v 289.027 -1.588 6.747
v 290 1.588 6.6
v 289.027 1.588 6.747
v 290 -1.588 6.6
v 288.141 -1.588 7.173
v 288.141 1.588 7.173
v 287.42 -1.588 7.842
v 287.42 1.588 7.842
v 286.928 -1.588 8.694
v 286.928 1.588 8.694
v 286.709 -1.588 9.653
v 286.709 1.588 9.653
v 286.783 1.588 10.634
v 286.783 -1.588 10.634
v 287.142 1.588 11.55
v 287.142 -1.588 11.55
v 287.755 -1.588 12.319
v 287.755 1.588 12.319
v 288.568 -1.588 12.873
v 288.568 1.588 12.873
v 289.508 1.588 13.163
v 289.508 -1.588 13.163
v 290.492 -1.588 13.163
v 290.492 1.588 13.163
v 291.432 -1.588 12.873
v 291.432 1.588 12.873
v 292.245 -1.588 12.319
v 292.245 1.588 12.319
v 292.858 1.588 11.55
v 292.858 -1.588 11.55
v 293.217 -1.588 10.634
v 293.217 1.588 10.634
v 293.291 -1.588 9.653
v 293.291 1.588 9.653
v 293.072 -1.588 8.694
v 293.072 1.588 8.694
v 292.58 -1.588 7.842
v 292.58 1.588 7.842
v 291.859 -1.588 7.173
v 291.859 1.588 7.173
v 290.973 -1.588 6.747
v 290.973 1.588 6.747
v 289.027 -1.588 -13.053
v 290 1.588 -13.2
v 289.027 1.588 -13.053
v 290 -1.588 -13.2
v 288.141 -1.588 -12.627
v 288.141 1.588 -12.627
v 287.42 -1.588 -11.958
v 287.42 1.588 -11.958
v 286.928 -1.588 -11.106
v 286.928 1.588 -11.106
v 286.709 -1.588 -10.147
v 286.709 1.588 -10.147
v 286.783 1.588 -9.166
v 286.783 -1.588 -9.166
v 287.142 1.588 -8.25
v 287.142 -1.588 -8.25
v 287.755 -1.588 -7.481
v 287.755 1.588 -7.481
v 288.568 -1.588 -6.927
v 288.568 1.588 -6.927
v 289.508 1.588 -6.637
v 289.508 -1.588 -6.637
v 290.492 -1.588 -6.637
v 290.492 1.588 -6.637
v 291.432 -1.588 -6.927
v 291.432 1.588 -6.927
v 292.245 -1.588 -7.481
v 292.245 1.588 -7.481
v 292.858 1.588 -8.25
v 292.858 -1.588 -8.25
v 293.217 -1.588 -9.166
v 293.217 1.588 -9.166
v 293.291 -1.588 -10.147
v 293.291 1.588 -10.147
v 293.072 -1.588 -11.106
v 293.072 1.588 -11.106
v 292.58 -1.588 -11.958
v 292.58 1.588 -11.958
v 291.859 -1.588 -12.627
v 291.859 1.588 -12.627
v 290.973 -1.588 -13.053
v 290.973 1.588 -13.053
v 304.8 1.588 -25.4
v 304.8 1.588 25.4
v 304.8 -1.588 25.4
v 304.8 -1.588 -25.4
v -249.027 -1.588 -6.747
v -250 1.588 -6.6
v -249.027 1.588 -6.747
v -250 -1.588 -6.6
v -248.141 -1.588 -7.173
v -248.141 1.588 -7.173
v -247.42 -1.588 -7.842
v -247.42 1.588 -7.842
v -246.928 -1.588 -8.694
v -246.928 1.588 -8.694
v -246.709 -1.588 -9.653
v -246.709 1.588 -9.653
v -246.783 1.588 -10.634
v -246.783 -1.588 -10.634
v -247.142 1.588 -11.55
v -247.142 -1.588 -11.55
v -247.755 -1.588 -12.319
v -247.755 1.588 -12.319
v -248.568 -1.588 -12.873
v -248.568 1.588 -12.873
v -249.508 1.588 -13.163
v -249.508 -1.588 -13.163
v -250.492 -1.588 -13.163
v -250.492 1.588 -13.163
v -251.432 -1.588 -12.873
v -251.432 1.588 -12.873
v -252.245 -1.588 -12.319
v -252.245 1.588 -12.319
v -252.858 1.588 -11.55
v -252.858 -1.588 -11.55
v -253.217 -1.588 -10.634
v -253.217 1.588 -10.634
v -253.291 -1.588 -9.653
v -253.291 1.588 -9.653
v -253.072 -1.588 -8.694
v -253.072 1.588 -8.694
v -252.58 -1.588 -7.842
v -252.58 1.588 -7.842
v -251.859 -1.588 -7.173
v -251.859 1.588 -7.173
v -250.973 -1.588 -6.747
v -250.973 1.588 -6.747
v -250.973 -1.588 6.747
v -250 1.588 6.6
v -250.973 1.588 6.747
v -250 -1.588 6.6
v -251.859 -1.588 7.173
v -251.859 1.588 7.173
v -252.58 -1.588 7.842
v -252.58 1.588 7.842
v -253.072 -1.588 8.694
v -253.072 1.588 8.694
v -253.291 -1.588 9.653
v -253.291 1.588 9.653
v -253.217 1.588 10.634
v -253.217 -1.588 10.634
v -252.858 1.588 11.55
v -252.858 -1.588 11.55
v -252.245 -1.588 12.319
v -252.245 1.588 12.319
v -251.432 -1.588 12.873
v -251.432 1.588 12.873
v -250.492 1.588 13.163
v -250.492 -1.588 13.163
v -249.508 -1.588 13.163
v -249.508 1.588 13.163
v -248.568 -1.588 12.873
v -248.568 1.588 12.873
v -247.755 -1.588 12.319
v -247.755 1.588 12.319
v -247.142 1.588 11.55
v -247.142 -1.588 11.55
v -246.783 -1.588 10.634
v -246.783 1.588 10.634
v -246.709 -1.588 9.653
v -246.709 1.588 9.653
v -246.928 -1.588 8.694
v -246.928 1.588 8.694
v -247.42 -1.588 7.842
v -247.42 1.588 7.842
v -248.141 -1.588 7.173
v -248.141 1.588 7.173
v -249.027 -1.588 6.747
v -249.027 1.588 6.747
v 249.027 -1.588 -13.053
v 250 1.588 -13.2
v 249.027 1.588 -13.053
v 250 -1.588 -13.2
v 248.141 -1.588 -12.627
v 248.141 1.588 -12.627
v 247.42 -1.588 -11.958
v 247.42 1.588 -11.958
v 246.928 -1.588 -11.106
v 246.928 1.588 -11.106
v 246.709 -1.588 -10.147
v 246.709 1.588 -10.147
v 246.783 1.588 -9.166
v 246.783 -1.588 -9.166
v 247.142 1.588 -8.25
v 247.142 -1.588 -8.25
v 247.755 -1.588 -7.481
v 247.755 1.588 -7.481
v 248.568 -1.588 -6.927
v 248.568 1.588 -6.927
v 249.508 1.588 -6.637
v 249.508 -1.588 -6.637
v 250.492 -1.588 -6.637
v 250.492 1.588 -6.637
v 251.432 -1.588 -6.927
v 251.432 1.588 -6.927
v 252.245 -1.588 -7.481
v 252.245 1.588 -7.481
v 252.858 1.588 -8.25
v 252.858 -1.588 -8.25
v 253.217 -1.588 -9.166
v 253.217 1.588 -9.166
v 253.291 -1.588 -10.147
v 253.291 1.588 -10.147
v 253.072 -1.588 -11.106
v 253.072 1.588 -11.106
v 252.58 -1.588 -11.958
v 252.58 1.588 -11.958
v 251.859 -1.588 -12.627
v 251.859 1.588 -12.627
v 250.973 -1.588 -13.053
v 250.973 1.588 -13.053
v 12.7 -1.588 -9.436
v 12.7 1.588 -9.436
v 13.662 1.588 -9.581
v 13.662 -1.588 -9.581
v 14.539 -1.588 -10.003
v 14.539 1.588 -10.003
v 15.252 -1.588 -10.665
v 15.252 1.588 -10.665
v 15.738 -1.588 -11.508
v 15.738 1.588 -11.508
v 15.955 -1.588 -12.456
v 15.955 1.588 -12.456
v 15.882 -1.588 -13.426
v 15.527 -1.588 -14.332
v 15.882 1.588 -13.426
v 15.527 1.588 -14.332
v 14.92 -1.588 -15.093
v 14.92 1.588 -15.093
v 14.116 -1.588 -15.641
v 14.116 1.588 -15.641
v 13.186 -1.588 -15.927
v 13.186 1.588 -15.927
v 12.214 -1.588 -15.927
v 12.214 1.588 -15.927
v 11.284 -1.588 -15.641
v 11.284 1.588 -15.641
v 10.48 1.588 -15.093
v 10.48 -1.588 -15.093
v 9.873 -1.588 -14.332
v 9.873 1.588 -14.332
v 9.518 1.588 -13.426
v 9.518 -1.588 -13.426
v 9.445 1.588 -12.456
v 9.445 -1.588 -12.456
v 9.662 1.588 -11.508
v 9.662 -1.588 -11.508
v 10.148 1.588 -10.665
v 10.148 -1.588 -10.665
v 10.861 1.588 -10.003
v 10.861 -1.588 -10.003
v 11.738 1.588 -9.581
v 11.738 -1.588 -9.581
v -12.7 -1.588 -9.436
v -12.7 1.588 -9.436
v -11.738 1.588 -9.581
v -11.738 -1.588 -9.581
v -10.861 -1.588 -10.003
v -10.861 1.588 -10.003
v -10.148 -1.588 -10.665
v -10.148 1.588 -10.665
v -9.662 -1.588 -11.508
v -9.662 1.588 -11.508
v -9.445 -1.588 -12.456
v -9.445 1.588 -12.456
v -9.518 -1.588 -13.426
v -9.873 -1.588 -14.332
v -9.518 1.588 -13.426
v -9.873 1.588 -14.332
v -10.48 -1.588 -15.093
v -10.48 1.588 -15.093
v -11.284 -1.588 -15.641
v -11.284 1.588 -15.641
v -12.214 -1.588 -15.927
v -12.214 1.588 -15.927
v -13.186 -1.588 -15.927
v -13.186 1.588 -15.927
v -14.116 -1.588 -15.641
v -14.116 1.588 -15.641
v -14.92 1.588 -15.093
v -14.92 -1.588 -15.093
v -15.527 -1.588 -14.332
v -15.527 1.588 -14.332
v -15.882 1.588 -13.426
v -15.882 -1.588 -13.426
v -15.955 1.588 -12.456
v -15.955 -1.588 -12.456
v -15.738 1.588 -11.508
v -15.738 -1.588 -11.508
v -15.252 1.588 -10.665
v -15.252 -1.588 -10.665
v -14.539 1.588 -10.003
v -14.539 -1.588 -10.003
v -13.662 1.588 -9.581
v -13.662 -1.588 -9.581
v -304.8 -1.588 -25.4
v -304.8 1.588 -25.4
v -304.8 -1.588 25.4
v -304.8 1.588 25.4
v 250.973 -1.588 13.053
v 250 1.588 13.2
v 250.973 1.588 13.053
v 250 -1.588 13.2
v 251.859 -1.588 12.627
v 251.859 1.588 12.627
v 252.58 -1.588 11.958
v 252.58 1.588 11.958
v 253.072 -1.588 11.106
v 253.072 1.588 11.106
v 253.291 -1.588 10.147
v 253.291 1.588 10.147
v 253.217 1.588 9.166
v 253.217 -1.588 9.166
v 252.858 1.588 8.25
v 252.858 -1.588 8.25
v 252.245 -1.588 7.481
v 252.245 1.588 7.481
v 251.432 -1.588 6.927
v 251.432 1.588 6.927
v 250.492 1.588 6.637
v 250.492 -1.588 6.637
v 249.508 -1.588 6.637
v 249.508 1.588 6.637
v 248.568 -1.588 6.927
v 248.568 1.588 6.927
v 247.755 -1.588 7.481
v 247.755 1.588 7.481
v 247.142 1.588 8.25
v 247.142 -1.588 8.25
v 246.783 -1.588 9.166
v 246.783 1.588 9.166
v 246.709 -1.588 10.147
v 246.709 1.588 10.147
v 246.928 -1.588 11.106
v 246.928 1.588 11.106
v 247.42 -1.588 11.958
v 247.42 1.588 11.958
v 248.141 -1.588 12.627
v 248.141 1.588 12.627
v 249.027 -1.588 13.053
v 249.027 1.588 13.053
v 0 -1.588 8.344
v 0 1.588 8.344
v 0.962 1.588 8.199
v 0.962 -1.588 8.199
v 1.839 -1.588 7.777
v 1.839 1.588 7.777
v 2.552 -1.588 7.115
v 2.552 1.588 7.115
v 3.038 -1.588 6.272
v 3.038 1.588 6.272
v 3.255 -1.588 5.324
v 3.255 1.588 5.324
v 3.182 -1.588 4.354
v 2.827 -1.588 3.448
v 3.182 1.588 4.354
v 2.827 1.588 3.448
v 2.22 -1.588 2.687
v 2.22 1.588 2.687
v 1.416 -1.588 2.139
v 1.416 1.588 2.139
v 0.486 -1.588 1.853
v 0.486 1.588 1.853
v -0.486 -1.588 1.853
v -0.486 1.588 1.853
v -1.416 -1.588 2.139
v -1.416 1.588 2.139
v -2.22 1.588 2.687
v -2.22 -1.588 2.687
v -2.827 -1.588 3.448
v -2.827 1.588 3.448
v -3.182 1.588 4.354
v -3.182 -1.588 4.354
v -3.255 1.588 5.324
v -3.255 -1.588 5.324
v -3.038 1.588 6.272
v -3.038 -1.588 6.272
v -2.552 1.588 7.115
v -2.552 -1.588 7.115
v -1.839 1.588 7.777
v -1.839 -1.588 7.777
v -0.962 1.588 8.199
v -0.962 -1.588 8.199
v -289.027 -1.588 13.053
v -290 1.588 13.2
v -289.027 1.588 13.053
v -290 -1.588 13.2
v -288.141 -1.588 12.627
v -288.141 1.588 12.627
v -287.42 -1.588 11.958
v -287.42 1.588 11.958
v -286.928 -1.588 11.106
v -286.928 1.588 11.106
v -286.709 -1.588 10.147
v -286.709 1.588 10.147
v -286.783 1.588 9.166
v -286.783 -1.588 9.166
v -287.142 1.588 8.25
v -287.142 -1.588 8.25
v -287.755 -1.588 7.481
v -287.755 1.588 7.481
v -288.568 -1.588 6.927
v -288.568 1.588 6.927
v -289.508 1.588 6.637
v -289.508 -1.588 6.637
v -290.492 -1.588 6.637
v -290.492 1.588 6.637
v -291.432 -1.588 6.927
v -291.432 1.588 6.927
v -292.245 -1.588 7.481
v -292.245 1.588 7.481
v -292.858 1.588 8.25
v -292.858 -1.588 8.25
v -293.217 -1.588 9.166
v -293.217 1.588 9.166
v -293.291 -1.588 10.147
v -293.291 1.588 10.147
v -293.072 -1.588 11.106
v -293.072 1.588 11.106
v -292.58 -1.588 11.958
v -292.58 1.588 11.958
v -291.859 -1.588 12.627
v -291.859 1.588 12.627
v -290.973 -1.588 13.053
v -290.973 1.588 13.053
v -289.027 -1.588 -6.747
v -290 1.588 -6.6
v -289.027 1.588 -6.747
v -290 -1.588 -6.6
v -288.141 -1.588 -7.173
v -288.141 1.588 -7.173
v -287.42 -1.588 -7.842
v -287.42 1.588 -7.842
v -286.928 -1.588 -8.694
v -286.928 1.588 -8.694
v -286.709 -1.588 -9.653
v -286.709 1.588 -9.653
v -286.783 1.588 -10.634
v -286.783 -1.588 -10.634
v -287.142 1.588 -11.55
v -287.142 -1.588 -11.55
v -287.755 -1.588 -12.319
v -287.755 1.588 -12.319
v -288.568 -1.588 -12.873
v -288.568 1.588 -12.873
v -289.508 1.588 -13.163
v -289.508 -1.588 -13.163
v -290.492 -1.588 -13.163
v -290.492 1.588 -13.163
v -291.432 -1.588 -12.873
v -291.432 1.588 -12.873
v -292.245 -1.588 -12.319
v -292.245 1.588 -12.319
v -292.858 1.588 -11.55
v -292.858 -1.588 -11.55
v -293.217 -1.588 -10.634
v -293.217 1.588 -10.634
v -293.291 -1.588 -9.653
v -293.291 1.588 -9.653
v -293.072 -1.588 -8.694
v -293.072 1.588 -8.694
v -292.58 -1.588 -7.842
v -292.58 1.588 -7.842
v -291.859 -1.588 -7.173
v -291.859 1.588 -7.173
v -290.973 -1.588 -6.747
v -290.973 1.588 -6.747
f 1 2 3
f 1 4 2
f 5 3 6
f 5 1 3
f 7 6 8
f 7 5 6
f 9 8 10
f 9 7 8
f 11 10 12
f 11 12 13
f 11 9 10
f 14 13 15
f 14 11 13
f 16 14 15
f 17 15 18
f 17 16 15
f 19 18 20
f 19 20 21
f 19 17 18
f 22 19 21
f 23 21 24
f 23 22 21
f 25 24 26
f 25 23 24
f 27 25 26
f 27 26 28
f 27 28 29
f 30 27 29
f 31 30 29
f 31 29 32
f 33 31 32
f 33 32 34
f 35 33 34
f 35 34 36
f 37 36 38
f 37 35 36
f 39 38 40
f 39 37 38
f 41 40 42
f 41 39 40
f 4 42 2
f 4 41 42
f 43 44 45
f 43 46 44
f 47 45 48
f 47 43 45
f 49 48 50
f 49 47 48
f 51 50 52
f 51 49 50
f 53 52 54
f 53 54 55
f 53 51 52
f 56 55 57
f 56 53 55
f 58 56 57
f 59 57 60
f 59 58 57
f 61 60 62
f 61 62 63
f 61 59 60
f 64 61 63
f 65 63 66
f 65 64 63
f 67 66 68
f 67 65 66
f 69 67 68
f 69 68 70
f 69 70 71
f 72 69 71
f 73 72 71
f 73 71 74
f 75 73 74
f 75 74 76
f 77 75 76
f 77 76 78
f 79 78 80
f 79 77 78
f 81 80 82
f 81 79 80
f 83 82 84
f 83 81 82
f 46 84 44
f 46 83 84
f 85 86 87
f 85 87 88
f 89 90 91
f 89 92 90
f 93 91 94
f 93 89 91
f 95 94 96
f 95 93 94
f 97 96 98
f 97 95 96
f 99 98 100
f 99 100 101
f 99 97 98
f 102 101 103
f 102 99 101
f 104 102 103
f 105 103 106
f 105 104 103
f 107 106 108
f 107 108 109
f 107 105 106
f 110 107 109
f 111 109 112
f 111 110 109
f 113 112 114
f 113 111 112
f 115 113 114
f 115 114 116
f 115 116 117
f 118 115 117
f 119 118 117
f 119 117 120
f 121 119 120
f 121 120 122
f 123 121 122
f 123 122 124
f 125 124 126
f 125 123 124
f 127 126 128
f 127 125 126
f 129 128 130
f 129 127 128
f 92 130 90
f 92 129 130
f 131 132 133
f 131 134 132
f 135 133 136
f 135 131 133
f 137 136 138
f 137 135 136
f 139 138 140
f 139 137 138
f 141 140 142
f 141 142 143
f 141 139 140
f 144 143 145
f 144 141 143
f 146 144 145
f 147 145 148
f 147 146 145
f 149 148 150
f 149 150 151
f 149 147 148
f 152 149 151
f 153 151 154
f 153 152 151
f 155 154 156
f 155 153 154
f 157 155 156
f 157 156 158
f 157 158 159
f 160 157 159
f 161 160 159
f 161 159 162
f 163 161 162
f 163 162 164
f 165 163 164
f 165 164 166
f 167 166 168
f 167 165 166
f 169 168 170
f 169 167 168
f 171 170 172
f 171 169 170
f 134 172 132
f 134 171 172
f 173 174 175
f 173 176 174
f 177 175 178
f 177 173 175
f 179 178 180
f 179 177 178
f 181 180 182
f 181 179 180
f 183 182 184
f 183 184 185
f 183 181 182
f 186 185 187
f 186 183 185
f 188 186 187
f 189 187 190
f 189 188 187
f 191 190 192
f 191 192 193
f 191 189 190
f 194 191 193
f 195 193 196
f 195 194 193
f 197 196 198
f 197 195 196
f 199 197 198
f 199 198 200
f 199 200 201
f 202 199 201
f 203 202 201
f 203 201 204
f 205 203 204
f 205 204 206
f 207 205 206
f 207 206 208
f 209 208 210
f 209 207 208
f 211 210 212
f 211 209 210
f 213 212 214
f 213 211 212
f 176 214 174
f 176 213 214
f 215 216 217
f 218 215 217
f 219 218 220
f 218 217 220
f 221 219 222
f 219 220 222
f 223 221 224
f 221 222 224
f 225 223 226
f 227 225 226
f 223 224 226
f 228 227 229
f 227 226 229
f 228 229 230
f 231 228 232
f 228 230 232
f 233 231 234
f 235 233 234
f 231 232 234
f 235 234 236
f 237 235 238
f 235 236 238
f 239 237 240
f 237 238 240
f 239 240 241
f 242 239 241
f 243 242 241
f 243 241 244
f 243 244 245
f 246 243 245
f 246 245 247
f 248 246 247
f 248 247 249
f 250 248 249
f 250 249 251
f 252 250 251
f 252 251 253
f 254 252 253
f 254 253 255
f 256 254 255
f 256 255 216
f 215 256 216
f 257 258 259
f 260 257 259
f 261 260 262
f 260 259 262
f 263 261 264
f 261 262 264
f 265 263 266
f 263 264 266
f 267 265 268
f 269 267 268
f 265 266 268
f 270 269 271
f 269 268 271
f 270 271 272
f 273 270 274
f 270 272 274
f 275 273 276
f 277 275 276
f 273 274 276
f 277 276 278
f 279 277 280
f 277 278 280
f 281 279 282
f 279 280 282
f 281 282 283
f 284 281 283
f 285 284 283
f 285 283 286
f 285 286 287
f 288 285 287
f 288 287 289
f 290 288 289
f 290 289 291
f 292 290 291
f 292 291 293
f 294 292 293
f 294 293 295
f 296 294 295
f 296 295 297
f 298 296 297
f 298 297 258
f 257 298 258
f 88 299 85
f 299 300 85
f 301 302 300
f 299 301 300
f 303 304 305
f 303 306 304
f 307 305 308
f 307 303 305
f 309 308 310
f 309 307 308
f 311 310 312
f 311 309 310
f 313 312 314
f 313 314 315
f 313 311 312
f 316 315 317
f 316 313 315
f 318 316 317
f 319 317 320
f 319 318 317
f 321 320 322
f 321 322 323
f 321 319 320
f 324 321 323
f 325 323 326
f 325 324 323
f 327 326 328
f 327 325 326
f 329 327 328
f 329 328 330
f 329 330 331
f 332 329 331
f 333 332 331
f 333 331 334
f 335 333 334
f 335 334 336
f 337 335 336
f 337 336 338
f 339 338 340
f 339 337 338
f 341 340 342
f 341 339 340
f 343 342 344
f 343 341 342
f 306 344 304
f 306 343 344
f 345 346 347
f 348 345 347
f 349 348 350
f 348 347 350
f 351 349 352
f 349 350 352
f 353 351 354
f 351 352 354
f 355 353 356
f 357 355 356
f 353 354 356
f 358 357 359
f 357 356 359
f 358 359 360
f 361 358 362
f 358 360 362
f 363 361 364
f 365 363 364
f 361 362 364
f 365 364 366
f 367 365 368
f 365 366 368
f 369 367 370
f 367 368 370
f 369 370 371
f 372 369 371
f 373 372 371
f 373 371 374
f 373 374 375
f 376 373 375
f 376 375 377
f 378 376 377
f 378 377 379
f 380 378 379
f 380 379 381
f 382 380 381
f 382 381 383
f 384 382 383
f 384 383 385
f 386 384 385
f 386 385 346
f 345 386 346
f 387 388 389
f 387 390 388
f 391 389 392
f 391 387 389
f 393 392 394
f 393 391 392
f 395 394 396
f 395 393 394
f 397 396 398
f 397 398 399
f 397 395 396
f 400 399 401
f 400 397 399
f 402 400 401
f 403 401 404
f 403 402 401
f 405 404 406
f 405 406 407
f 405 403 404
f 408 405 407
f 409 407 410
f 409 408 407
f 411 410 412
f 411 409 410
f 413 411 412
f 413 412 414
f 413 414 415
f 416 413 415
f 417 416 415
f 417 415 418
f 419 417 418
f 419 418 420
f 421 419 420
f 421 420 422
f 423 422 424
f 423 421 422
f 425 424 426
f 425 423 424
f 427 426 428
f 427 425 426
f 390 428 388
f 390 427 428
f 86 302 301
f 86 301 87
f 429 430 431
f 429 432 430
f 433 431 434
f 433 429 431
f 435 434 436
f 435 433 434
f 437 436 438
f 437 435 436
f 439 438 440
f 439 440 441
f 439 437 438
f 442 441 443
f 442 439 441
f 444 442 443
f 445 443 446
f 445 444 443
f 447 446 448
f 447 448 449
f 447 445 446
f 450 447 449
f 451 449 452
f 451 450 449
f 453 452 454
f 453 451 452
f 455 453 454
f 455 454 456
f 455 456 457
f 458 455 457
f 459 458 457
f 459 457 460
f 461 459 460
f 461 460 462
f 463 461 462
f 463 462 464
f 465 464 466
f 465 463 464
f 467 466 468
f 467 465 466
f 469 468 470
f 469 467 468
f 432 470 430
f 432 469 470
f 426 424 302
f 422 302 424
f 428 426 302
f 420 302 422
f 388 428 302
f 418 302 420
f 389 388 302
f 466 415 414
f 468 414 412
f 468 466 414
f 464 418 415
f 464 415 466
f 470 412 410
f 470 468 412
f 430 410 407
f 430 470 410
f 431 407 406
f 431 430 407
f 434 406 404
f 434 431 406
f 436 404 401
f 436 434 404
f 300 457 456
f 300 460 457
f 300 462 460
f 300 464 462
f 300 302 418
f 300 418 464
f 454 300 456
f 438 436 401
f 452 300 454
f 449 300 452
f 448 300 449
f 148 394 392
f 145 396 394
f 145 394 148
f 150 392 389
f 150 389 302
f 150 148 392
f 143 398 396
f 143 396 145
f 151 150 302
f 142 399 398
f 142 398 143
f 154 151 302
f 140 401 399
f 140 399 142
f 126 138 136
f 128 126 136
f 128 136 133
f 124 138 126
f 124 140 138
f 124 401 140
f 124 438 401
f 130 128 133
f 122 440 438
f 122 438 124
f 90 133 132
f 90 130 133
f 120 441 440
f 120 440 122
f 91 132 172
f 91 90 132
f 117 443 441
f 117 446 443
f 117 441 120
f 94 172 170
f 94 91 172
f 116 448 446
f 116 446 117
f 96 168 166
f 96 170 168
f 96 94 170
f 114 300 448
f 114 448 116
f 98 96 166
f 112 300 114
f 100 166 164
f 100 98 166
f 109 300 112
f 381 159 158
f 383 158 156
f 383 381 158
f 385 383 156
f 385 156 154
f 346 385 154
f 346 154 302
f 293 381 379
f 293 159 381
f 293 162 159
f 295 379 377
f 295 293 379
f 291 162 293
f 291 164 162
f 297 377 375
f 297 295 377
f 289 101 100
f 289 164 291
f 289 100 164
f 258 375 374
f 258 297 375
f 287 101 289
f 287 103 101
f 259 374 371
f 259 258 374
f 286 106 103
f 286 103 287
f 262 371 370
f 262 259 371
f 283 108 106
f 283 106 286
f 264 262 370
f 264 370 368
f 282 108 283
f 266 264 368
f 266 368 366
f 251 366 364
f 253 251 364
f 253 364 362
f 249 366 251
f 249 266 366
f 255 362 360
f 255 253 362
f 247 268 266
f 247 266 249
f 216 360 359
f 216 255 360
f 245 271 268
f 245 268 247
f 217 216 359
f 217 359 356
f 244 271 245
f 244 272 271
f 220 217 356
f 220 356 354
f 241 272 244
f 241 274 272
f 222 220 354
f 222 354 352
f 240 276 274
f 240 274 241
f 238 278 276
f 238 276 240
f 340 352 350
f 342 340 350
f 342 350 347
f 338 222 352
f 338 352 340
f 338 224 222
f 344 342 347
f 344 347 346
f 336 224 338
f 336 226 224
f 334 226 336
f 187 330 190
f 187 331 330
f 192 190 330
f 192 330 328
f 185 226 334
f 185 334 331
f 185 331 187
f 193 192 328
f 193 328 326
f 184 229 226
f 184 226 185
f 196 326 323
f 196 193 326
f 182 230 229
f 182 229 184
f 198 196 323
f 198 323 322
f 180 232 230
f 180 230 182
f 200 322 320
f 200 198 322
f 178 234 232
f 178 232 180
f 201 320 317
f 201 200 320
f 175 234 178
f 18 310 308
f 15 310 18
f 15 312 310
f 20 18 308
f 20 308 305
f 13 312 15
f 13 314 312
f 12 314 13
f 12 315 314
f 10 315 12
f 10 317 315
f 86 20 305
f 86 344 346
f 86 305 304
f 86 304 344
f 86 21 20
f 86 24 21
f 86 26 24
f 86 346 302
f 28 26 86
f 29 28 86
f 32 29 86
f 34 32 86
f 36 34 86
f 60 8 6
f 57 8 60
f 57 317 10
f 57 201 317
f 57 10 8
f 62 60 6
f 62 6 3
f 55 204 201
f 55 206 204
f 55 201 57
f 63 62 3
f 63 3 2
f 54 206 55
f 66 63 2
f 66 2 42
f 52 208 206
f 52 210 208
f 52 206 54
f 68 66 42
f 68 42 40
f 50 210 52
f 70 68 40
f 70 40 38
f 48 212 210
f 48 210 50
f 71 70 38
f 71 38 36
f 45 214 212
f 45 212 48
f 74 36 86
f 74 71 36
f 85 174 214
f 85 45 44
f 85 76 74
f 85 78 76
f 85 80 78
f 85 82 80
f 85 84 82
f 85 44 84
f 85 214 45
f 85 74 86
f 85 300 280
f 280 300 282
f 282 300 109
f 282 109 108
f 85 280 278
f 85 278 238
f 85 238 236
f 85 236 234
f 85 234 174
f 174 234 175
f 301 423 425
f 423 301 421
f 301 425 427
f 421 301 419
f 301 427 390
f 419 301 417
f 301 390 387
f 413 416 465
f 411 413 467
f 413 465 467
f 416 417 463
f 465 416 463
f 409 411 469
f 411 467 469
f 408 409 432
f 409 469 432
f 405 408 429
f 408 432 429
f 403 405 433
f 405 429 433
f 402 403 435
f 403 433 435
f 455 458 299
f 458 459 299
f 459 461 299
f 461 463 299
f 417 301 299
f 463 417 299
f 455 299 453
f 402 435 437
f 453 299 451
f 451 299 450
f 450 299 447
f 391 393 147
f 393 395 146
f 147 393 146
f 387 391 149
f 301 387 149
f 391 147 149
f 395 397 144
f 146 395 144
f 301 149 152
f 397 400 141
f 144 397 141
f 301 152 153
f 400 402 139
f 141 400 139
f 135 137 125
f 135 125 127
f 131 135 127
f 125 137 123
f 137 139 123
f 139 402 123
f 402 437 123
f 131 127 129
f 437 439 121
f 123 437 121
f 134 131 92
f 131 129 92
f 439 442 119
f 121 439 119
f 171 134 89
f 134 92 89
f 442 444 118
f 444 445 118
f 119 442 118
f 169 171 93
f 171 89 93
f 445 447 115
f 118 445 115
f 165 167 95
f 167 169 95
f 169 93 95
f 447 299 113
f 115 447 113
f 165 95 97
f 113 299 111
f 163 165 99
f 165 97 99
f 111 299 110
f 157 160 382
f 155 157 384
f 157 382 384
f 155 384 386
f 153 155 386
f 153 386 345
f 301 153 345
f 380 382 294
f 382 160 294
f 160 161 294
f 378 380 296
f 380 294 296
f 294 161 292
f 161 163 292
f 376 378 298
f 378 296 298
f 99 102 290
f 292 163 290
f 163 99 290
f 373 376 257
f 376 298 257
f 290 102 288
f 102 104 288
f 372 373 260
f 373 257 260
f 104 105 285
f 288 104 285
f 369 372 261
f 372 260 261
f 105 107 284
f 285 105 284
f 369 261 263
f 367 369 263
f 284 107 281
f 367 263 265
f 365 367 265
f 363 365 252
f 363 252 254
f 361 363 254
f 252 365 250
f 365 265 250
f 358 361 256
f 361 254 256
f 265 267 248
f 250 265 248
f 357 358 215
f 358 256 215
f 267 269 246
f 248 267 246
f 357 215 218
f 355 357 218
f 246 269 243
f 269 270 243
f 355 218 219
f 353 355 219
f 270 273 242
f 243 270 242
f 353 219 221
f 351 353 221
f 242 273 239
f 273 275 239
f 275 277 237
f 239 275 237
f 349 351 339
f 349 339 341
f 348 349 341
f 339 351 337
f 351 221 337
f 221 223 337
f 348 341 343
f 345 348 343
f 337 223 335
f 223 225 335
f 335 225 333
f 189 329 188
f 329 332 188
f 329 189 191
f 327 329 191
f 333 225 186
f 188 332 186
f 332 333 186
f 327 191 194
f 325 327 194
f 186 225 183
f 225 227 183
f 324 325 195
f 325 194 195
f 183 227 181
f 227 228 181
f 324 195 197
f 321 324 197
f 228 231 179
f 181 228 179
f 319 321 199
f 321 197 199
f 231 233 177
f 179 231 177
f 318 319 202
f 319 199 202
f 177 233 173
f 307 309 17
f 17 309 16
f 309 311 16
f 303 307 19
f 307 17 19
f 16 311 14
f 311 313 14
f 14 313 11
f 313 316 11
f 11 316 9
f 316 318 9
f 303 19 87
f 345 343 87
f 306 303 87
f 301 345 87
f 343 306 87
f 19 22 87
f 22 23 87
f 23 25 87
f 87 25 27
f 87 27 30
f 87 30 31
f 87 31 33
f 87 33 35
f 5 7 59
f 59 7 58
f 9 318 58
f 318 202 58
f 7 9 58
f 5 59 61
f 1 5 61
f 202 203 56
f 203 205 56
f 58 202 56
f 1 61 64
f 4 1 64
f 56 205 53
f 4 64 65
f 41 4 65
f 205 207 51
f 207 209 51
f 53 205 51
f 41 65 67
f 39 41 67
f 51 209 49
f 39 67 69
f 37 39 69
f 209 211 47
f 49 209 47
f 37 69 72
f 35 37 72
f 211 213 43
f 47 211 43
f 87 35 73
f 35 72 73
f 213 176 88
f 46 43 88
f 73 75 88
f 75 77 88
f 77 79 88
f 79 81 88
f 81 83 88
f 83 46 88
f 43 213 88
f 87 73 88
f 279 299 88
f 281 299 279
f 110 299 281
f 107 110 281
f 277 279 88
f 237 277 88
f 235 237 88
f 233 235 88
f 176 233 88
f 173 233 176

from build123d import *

# Parameters (mm, degrees)
SKETCH1_W                      = 609.6
SKETCH1_H                      = 50.8
SKETCH1_R                      = 3.3
BOSS_EXTRUDE1_DEPTH            = 1.5875
SKETCH2_R                      = 3.2639
F_1_4_20_FOR_NUT_BRACKET_DEPTH = 306.872981195


with BuildPart() as part:
    # Sketch1 → Boss-Extrude1 (new, symmetric)
    with BuildSketch(Plane(origin=(0, 0, 0), x_dir=(1, 0, 0), z_dir=(0, 1, 0))):
        Rectangle(SKETCH1_W, SKETCH1_H)
        with Locations(Location((-250, 9.9, 0), (0, 0, 270))):
            Circle(SKETCH1_R, mode=Mode.SUBTRACT)
        with Locations(Location((-250, -9.9, 0), (0, 0, 90))):
            Circle(SKETCH1_R, mode=Mode.SUBTRACT)
        with Locations(Location((-290, 9.9, 0), (0, 0, 270))):
            Circle(SKETCH1_R, mode=Mode.SUBTRACT)
        with Locations(Location((-290, -9.9, 0), (0, 0, 270))):
            Circle(SKETCH1_R, mode=Mode.SUBTRACT)
        with Locations(Location((290, -9.9, 0), (0, 0, 90))):
            Circle(SKETCH1_R, mode=Mode.SUBTRACT)
        with Locations(Location((290, 9.9, 0), (0, 0, 90))):
            Circle(SKETCH1_R, mode=Mode.SUBTRACT)
        with Locations(Location((250, -9.9, 0), (0, 0, 270))):
            Circle(SKETCH1_R, mode=Mode.SUBTRACT)
        with Locations(Location((250, 9.9, 0), (0, 0, 90))):
            Circle(SKETCH1_R, mode=Mode.SUBTRACT)
    extrude(amount=BOSS_EXTRUDE1_DEPTH, both=True)

    # Sketch2 → 1/4-20 For Nut Bracket (cut, through all)
    with BuildSketch(Plane(origin=(0, 1.5875, 0), x_dir=(1, 0, 0), z_dir=(0, 1, 0))):
        with Locations(Location((-12.7, 12.7, 0), (0, 0, 270))):
            Circle(SKETCH2_R)
        with Locations(Location((12.7, 12.7, 0), (0, 0, 270))):
            Circle(SKETCH2_R)
        with Locations(Location((0, -5.08, 0), (0, 0, 270))):
            Circle(SKETCH2_R)
    extrude(amount=-F_1_4_20_FOR_NUT_BRACKET_DEPTH, mode=Mode.SUBTRACT)


solid = part.part
